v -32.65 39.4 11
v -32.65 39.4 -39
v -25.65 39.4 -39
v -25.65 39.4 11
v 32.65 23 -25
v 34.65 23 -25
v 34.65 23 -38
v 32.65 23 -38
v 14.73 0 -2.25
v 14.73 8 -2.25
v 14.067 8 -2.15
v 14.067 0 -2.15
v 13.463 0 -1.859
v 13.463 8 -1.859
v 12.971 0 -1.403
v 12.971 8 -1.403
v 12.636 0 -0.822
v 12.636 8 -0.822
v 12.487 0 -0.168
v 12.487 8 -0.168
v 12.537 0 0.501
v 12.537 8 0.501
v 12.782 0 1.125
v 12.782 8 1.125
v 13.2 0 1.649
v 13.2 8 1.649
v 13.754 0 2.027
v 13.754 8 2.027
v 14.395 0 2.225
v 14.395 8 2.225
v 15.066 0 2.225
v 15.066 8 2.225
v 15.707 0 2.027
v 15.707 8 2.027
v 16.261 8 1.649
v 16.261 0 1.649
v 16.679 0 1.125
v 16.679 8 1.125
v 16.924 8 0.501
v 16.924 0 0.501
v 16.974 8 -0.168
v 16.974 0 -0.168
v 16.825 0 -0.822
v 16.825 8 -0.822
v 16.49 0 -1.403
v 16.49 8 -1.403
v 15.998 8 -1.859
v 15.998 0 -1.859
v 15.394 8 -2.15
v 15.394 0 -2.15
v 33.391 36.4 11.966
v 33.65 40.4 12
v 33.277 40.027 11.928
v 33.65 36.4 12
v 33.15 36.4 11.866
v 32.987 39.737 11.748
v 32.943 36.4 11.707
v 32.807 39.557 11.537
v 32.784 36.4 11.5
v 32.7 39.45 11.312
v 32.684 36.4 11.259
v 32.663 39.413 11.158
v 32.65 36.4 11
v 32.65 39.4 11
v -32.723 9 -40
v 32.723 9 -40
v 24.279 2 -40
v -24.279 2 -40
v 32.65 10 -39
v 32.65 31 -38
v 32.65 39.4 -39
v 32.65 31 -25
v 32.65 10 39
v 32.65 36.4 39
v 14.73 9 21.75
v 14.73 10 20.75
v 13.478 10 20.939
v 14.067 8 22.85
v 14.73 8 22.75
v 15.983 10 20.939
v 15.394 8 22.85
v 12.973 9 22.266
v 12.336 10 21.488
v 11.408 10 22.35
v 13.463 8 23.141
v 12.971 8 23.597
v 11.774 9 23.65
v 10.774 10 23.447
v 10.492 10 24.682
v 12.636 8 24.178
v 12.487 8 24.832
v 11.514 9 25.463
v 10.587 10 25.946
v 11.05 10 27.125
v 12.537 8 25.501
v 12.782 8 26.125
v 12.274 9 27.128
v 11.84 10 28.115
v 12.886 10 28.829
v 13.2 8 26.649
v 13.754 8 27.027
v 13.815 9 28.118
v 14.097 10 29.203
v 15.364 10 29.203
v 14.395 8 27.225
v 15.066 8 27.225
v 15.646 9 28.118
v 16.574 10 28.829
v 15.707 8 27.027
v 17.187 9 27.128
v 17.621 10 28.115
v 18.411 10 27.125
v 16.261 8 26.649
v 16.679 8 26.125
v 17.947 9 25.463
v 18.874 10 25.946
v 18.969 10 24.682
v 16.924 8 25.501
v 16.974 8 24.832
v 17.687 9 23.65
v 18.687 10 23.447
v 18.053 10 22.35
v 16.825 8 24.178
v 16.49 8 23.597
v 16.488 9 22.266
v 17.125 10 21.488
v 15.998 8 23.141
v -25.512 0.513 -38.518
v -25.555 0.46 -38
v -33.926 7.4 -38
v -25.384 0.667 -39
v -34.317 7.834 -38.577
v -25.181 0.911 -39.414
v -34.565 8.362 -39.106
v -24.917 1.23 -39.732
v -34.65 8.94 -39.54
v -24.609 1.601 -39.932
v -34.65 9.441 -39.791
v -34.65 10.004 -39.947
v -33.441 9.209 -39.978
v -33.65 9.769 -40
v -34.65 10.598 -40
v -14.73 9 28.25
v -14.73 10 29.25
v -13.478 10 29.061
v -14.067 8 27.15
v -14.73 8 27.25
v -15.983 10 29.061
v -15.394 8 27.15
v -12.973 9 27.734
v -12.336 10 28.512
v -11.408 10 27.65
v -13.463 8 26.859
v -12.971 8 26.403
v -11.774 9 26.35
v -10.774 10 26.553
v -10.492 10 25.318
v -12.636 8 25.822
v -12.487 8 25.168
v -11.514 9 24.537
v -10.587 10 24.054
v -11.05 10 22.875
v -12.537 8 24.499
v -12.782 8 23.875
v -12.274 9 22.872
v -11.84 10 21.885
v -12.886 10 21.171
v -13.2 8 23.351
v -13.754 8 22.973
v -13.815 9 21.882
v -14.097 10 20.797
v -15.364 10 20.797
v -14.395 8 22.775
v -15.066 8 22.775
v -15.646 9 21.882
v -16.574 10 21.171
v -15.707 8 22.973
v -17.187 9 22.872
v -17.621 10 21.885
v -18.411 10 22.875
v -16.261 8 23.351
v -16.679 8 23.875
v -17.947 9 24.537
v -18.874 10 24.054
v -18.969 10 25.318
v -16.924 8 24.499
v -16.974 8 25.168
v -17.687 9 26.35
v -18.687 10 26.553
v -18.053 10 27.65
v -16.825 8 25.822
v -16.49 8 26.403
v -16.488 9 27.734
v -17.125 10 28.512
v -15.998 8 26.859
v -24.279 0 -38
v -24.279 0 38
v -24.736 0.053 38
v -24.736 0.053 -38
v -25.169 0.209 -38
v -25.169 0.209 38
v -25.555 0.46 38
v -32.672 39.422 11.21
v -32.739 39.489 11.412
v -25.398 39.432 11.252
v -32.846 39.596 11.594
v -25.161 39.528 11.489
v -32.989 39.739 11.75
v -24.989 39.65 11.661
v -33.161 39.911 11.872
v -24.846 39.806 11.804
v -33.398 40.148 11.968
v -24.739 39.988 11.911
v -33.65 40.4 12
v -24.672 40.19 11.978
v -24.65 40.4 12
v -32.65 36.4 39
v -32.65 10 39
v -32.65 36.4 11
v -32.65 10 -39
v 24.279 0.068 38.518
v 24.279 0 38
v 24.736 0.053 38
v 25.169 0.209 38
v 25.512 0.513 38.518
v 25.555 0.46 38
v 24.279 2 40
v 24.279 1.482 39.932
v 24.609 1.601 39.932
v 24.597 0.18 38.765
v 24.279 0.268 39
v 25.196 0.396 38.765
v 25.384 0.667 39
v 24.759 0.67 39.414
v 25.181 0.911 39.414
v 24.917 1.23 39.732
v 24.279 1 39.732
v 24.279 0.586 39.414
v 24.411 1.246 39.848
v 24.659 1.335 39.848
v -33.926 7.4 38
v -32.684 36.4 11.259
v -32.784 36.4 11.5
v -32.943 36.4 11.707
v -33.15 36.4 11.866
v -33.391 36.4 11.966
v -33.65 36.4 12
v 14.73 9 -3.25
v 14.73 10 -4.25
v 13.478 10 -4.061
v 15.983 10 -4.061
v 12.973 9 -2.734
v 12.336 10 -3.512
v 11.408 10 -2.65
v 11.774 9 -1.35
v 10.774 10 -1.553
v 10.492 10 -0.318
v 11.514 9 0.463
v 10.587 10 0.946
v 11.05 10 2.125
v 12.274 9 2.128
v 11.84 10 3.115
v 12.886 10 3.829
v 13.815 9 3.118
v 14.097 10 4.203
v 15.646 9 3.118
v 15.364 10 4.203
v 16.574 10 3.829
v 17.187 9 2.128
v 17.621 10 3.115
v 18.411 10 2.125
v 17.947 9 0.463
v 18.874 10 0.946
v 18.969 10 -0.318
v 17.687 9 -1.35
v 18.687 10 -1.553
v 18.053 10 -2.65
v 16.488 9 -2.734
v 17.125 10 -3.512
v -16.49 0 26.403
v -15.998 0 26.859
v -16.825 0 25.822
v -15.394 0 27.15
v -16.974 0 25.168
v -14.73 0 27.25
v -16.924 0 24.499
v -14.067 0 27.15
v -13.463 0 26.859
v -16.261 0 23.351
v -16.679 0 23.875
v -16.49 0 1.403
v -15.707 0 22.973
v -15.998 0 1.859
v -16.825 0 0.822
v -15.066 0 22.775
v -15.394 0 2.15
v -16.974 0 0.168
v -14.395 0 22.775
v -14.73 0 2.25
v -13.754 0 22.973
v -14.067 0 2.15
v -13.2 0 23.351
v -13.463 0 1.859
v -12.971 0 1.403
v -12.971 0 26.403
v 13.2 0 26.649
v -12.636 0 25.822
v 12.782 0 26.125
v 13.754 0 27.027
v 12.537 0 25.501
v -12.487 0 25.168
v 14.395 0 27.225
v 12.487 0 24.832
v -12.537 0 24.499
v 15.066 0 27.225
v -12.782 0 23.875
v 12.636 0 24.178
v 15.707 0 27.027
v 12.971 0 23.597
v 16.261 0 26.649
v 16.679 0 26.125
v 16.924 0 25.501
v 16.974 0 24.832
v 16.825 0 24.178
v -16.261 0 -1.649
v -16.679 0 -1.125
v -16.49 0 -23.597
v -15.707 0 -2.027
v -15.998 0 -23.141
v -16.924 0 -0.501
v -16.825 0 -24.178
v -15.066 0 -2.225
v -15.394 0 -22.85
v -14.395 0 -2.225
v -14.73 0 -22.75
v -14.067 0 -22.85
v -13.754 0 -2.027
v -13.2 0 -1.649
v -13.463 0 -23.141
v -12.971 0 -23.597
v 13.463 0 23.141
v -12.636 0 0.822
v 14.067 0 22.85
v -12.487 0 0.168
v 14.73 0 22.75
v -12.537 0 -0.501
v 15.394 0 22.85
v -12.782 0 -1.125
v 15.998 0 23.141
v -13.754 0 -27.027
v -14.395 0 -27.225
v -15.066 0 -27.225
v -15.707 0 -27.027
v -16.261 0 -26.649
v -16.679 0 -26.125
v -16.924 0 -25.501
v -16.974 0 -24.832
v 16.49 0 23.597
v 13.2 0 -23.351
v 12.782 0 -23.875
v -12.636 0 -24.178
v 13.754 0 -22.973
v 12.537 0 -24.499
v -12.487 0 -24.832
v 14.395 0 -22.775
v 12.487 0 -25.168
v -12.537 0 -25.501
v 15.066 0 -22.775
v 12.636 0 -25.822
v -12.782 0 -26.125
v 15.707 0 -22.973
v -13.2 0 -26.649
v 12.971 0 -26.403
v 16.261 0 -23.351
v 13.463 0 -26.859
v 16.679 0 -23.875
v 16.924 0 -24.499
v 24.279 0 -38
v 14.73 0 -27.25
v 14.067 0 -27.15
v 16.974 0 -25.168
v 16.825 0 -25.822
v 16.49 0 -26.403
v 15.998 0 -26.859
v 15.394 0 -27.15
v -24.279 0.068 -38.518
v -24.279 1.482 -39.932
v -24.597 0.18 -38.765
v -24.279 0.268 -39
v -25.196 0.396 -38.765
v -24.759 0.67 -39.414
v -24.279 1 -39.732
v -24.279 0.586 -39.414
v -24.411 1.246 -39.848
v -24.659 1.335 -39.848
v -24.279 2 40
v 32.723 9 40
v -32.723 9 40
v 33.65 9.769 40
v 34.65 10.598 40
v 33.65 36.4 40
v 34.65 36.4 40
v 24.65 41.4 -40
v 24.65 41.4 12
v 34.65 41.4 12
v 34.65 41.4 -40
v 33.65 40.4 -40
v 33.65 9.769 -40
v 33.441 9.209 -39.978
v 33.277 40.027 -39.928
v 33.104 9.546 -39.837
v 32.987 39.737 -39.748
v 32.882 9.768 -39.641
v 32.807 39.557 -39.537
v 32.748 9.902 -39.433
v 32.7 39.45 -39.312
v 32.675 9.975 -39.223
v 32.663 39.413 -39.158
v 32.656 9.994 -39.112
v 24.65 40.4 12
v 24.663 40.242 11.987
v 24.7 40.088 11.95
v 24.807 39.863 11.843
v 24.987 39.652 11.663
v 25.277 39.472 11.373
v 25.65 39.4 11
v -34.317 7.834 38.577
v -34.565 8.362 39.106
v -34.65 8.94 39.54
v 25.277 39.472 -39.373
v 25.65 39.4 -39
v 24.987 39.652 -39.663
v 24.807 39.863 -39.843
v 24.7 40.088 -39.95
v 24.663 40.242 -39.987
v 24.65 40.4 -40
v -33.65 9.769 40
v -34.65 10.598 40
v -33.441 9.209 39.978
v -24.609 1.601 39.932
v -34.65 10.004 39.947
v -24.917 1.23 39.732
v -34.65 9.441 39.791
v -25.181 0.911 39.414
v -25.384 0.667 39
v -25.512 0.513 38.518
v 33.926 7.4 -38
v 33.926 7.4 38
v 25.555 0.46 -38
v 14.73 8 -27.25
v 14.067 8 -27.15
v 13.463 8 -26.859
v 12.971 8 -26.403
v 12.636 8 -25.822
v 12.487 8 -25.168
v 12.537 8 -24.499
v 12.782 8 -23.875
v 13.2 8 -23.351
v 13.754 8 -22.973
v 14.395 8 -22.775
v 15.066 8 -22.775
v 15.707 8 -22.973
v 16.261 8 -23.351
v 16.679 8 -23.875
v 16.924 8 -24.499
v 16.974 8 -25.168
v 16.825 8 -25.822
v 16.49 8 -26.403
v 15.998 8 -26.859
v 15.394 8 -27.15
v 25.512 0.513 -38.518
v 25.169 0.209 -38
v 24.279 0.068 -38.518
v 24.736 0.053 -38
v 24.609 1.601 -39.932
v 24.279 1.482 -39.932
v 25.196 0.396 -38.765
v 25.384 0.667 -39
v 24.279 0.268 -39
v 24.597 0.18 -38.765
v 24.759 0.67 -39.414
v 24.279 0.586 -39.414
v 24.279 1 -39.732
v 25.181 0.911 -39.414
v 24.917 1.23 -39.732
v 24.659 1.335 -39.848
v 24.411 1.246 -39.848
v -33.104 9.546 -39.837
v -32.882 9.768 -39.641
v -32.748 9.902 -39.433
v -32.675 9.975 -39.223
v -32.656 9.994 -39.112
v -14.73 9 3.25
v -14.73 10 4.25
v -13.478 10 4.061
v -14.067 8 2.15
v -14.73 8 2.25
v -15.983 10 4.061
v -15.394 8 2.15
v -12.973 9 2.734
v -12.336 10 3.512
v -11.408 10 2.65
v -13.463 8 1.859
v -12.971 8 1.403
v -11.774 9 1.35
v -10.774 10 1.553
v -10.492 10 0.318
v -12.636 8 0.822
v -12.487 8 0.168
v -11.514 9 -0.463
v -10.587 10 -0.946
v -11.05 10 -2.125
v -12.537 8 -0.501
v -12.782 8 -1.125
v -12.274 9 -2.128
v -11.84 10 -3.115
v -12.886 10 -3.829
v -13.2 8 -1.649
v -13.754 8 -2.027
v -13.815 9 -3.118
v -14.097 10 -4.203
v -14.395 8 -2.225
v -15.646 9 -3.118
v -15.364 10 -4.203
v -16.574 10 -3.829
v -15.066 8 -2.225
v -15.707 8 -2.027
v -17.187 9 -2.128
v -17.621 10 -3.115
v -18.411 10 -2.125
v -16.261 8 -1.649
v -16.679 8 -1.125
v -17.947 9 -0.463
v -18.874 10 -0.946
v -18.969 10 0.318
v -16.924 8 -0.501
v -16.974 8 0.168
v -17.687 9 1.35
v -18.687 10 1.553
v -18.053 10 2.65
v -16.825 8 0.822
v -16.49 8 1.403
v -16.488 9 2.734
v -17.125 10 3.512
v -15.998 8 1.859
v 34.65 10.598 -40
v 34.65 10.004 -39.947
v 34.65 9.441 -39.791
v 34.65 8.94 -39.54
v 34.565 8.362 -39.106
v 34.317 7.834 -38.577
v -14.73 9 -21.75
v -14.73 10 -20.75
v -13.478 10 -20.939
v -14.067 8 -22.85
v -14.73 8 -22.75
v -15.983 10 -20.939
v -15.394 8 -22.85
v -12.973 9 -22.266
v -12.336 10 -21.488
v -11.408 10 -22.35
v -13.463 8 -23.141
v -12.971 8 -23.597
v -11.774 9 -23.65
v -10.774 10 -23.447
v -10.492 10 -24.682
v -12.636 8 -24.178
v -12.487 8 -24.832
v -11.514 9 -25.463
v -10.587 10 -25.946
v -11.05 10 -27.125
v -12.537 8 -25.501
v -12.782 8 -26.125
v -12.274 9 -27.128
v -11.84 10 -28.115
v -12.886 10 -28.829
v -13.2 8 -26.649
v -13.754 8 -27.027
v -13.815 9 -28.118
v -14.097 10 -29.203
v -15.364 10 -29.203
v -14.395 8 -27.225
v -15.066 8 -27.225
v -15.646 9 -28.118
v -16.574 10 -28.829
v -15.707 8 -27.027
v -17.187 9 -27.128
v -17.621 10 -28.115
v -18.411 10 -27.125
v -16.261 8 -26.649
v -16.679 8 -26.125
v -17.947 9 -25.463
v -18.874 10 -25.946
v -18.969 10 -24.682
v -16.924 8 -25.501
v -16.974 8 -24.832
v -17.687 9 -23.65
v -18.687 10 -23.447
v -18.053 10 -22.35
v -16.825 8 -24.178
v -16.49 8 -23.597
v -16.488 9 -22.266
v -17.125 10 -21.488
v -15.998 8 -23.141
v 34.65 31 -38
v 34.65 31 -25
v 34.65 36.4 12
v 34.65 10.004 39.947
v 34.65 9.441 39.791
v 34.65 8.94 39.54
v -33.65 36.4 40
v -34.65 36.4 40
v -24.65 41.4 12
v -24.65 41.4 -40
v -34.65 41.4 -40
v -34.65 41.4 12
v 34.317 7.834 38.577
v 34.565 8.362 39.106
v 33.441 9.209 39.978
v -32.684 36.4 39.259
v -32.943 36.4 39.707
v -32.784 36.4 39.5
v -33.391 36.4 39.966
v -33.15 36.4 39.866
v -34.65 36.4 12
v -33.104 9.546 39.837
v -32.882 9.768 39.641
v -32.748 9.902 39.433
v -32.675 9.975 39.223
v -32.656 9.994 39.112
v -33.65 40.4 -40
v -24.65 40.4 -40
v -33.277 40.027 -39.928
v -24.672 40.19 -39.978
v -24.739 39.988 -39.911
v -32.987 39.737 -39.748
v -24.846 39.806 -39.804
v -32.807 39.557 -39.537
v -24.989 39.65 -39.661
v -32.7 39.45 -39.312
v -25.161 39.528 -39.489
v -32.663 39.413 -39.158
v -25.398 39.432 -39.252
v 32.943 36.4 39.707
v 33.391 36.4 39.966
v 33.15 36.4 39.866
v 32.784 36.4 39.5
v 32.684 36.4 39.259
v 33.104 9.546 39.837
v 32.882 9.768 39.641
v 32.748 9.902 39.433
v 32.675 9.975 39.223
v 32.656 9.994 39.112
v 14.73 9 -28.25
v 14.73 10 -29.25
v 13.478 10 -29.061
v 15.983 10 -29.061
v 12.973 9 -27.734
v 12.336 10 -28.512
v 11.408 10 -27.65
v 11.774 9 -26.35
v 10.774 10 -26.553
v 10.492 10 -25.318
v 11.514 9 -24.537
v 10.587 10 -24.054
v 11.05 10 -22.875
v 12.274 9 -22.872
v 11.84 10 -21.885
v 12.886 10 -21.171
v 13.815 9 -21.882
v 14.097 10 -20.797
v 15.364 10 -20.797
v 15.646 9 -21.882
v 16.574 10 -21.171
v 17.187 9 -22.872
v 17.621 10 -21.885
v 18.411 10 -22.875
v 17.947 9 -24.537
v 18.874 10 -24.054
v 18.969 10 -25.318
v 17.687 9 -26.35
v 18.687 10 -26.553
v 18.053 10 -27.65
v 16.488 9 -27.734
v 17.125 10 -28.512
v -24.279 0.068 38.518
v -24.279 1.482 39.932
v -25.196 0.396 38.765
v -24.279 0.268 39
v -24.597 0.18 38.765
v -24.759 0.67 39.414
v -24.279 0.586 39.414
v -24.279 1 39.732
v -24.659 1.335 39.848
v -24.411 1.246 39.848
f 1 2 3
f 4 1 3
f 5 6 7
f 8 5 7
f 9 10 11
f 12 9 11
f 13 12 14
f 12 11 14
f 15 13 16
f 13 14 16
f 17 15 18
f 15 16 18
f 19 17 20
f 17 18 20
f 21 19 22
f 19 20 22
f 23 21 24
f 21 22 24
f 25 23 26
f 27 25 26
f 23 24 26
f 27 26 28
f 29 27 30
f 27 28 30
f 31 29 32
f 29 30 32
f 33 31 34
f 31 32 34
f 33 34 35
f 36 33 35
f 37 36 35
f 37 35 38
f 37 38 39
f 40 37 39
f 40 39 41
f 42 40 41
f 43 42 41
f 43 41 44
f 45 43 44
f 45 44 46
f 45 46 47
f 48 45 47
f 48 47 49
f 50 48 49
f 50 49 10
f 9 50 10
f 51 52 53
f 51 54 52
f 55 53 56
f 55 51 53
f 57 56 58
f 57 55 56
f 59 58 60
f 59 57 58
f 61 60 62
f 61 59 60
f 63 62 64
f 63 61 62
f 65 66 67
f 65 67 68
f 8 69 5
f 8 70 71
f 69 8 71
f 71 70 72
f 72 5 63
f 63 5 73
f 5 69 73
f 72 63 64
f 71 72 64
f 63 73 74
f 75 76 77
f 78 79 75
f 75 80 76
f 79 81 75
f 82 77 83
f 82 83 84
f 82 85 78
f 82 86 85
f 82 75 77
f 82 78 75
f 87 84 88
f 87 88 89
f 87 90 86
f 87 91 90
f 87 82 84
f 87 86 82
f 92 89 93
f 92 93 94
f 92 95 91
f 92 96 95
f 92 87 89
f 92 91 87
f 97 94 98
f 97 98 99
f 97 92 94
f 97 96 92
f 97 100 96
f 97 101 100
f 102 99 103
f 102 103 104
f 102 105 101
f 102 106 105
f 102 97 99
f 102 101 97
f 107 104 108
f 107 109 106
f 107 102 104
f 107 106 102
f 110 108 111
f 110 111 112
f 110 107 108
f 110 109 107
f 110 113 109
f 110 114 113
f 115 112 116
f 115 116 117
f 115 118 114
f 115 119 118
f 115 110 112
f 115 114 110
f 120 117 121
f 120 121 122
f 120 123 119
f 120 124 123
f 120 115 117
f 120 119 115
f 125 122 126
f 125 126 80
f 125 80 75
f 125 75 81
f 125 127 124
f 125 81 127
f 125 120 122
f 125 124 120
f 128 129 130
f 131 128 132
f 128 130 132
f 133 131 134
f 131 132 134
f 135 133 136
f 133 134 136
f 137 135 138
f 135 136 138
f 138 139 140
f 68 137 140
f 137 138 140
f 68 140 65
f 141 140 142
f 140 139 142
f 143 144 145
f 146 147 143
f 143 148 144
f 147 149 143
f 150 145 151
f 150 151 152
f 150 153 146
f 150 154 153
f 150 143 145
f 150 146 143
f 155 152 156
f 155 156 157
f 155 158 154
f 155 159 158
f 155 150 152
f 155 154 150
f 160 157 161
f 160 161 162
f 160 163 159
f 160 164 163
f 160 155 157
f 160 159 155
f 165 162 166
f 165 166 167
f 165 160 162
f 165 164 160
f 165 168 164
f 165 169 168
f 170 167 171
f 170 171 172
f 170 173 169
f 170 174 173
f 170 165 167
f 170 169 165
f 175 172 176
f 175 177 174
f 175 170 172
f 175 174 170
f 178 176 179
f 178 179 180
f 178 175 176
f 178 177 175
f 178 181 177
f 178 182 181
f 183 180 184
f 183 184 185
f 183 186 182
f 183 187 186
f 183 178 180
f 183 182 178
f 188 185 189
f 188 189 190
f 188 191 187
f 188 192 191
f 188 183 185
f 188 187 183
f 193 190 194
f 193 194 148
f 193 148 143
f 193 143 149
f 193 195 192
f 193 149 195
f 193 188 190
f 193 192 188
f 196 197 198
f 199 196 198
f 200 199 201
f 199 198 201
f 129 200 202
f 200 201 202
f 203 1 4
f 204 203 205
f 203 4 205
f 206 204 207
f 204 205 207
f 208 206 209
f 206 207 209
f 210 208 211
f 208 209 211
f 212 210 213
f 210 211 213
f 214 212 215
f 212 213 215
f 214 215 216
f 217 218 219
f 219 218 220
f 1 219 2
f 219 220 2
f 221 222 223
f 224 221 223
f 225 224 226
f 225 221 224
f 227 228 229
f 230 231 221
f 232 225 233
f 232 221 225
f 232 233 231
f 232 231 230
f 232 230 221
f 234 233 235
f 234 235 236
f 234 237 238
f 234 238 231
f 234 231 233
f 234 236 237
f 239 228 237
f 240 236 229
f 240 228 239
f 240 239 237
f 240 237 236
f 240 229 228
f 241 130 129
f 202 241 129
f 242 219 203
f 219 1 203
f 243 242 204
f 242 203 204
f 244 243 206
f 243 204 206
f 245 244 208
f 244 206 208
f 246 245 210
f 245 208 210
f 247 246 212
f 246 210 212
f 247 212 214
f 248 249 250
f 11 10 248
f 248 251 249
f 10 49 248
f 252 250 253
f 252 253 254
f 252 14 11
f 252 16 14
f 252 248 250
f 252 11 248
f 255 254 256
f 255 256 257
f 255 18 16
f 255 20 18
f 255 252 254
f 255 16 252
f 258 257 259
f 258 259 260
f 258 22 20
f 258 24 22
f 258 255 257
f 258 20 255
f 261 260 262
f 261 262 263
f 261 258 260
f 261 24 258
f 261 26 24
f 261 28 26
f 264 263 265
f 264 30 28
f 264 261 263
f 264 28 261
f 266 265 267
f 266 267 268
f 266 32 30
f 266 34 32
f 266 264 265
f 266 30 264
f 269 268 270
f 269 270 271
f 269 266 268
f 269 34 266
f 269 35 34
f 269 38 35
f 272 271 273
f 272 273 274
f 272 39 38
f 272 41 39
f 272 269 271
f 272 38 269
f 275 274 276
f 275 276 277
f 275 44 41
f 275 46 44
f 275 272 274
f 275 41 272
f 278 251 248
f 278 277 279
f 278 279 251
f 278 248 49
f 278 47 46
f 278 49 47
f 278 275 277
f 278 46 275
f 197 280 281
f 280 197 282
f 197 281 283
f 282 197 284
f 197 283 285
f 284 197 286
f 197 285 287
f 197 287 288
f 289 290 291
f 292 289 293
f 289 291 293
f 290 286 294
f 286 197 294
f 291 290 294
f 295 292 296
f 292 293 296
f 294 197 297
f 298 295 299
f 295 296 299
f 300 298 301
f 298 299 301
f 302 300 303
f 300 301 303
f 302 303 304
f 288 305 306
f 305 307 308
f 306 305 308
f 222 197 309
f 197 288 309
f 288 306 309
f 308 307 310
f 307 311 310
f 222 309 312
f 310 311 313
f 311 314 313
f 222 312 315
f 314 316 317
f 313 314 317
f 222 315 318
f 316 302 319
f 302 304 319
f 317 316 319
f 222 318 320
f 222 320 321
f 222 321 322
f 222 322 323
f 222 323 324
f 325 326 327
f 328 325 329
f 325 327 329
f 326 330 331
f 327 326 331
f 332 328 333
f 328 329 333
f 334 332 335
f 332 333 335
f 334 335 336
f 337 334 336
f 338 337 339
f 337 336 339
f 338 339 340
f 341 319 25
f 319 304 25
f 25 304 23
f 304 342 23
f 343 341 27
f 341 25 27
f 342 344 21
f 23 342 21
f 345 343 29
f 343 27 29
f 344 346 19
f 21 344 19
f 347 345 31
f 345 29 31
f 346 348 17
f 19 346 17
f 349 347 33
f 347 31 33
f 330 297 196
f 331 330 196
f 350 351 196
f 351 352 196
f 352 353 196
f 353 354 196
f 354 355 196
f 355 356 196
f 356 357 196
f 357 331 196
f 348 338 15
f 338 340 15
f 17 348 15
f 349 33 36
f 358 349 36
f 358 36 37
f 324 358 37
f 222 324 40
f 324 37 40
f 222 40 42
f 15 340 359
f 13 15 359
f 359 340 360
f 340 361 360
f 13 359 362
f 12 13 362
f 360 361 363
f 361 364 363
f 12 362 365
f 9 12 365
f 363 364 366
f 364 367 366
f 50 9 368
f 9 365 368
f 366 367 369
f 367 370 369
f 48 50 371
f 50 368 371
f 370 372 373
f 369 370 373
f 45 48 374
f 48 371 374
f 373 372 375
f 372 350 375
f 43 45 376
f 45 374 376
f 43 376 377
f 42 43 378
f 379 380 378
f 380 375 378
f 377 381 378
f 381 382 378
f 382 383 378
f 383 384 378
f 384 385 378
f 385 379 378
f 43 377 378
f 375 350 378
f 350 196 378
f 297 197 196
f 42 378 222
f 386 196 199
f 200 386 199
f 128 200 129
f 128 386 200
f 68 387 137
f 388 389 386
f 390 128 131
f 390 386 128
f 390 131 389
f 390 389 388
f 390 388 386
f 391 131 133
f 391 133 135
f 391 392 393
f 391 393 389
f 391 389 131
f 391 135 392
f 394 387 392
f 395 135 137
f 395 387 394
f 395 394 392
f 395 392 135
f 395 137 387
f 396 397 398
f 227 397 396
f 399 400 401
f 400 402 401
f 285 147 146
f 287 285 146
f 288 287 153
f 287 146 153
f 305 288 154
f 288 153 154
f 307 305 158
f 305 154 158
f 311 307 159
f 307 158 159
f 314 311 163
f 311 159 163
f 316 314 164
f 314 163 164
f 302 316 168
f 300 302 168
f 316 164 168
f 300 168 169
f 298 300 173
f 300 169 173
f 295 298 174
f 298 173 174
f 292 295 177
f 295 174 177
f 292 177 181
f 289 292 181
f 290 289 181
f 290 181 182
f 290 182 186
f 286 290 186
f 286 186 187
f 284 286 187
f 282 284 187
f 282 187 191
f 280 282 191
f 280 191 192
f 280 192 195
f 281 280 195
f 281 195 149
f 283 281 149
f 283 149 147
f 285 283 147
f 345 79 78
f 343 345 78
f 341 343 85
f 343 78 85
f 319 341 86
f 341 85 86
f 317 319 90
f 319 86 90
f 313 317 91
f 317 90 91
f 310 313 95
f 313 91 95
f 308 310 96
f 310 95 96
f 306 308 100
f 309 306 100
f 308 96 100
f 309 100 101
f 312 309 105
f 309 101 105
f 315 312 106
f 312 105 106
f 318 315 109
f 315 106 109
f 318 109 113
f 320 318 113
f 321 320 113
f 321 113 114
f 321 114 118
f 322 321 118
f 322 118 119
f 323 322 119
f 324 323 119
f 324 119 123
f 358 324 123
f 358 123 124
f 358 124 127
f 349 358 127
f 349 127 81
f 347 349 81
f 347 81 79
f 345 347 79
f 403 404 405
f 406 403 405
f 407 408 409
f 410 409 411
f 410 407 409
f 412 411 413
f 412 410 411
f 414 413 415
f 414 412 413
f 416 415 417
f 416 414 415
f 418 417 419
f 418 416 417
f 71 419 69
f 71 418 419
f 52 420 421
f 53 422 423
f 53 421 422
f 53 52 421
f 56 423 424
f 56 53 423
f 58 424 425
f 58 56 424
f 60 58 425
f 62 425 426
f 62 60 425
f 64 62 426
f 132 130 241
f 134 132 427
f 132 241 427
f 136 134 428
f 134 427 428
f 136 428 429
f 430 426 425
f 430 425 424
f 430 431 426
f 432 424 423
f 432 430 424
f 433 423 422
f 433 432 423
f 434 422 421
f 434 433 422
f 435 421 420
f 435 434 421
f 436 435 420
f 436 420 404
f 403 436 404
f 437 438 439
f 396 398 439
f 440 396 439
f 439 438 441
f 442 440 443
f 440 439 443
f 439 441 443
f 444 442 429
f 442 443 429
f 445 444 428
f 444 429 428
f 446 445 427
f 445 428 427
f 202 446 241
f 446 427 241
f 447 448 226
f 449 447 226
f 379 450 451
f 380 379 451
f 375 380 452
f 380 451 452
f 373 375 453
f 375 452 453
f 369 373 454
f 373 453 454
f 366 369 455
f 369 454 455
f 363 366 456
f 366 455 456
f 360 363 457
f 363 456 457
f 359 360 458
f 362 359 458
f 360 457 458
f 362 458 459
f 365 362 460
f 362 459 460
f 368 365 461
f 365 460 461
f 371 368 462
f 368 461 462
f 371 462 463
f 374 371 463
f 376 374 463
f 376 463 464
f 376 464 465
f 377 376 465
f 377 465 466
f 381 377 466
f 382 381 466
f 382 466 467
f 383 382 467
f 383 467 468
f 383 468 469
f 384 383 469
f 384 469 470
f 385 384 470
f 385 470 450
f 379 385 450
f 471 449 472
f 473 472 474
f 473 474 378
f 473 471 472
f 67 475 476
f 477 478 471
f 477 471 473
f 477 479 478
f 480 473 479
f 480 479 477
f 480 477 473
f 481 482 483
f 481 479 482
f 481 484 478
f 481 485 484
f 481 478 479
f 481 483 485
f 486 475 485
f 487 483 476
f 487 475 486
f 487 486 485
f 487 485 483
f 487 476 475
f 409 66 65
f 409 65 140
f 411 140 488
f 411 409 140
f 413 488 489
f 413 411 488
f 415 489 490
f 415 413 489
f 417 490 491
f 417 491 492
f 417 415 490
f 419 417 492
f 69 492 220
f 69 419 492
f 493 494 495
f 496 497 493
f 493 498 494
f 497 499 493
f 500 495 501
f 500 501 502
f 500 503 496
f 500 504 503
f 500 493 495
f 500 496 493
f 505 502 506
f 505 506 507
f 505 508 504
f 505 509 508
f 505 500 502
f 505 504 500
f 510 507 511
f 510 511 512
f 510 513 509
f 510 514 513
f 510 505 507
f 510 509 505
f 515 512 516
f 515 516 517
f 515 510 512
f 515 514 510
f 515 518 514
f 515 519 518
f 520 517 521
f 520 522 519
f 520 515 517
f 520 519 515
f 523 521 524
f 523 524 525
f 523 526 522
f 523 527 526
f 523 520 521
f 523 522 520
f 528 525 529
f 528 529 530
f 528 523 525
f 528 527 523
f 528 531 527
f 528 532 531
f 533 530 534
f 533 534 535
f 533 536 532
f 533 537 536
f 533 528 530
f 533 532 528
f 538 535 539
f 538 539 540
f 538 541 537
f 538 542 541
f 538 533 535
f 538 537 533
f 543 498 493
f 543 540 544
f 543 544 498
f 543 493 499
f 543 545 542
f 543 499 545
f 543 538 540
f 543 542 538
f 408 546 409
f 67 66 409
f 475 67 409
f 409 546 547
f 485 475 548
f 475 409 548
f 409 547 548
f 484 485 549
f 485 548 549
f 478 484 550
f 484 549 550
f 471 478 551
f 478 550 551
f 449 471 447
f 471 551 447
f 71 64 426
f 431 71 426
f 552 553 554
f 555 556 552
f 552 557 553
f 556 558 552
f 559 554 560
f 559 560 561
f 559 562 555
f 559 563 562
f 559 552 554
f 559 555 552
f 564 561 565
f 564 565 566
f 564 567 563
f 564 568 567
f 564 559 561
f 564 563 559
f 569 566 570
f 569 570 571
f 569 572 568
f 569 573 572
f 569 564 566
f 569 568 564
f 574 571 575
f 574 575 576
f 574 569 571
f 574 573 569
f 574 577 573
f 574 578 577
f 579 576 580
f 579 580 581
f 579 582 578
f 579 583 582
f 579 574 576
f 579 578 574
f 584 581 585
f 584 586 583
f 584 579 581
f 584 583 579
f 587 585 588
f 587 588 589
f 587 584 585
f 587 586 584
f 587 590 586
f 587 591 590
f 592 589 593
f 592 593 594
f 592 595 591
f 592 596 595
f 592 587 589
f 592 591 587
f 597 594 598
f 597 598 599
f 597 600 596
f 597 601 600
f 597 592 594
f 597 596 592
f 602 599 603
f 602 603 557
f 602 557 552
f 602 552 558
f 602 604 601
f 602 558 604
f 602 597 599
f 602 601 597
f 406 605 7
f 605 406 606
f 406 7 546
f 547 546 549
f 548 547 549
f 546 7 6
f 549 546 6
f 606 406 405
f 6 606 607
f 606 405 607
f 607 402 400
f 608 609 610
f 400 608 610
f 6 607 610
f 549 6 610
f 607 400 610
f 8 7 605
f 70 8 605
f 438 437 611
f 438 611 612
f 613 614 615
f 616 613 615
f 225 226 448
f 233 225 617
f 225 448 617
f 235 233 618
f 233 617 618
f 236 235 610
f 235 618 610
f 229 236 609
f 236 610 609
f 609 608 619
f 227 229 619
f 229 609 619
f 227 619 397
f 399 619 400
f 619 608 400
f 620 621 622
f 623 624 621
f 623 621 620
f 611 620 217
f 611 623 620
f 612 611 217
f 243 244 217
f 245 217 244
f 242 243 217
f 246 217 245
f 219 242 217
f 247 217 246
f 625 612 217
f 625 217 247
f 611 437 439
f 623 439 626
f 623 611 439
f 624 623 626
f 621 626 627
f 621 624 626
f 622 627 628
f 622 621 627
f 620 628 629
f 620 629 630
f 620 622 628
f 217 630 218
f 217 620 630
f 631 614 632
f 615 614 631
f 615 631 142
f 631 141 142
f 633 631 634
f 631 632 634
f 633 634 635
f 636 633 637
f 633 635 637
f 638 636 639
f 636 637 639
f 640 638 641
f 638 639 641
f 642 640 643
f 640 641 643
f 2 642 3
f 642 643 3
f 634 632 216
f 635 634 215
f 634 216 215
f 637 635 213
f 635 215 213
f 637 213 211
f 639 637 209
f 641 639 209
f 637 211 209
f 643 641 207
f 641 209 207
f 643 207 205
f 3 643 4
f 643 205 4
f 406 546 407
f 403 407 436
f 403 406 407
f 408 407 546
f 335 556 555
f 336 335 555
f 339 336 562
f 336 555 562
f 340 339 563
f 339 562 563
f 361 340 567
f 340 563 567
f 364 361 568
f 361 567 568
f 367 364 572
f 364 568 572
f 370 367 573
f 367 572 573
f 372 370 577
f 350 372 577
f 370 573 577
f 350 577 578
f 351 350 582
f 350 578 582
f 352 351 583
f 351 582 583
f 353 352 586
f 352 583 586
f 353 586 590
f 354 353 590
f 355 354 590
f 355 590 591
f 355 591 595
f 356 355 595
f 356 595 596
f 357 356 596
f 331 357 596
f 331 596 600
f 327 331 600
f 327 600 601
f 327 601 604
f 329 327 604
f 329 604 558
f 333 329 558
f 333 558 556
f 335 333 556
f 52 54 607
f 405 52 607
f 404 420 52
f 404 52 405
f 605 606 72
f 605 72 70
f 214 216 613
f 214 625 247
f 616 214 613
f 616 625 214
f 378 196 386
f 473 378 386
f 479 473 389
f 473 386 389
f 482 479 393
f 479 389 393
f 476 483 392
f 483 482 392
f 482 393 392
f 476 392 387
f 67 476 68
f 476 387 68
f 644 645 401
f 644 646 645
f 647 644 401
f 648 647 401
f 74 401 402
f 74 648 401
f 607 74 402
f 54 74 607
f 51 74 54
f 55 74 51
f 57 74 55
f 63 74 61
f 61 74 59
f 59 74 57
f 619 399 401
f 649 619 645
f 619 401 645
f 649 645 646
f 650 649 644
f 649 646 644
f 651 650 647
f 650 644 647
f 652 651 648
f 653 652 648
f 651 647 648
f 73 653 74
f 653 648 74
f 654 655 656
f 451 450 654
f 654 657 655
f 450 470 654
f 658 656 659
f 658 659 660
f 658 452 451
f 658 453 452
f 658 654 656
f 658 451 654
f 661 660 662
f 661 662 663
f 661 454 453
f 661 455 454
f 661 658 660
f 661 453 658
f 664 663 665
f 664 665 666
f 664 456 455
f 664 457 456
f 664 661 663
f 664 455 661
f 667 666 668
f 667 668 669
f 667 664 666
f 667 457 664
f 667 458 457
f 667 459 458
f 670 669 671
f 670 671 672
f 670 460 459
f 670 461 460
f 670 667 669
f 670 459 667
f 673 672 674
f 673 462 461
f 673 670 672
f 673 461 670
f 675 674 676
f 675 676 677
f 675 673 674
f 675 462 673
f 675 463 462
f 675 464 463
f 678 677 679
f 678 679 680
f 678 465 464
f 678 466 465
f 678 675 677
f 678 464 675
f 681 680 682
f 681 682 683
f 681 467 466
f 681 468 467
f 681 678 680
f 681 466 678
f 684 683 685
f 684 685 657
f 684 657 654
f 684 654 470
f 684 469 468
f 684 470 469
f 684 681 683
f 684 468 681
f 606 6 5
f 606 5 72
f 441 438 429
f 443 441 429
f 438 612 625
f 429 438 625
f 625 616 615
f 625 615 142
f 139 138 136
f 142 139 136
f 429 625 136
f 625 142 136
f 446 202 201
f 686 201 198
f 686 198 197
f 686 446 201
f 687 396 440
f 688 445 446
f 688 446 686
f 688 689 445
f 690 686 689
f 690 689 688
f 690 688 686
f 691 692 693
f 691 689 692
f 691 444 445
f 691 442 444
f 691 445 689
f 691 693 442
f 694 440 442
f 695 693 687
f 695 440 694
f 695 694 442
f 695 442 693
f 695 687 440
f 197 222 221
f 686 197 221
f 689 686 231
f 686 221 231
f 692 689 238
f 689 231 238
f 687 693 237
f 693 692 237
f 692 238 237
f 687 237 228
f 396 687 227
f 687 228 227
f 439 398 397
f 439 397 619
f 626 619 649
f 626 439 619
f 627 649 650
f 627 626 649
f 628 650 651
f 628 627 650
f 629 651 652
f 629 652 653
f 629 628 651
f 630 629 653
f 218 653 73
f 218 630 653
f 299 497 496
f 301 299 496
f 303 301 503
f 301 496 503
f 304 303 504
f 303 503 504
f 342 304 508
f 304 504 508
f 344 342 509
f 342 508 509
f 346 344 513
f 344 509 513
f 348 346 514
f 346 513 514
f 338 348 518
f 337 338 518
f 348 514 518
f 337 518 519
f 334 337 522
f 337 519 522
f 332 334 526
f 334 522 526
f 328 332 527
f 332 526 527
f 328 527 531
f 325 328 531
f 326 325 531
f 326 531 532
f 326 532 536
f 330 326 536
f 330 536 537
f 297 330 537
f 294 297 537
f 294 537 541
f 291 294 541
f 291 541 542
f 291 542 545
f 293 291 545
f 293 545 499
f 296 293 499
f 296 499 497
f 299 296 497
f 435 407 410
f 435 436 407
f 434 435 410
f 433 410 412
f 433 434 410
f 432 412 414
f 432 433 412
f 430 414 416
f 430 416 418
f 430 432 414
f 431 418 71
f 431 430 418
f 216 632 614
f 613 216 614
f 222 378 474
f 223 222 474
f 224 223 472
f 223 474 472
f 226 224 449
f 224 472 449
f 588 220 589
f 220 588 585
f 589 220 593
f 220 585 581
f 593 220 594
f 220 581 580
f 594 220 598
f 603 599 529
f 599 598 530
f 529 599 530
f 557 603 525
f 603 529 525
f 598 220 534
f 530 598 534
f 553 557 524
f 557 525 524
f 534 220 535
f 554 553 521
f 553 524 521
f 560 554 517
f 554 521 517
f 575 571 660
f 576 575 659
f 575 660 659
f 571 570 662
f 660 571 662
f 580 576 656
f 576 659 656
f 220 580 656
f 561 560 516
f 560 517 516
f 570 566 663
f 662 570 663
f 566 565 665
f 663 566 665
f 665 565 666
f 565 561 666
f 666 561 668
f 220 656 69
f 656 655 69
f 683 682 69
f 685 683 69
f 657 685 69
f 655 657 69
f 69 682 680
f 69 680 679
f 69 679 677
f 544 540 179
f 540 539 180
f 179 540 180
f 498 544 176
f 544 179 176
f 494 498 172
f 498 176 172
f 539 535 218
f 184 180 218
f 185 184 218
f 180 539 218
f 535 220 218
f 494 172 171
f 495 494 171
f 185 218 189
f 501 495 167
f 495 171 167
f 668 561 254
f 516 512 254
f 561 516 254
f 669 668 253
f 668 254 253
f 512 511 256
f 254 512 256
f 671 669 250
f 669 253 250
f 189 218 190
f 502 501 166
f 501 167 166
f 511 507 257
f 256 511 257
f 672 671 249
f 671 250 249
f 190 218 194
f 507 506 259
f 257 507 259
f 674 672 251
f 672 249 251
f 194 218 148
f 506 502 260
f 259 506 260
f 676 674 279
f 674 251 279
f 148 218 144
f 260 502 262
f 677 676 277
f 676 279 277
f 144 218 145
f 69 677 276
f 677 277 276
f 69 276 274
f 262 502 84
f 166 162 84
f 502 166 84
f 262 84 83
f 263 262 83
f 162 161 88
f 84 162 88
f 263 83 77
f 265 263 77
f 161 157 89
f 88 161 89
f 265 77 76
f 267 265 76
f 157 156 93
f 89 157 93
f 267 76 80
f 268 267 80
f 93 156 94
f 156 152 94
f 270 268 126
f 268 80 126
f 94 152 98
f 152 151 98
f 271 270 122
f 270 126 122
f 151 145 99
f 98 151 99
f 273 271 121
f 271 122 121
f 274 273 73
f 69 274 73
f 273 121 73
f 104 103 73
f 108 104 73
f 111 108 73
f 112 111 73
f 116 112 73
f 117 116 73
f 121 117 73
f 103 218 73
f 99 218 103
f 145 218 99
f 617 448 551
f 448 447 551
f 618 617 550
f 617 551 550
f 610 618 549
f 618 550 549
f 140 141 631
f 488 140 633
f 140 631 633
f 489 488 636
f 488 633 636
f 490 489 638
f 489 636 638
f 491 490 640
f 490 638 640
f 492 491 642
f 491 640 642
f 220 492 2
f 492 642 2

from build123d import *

# Parameters (mm, degrees)
SKETCH1_W               = 50
SKETCH1_H               = 80
BOSS_EXTRUDE1_DEPTH     = 10
SKETCH2_R               = 2.25
CUT_EXTRUDE1_DEPTH      = 49.218253805
CHAMFER1_SIZE           = 2
BOSS_EXTRUDE2_DEPTH     = 40
CUT_EXTRUDE2_DEPTH      = 68.19064295
CUT_EXTRUDE2_DEPTH_BACK = 68.19064295
SKETCH4_W               = 28
SKETCH4_H               = 5
CUT_EXTRUDE3_REACH      = 92.091
SKETCH5_W               = 13
SKETCH5_H               = 8
FILLET1_R               = 1
FILLET2_R               = 2


with BuildPart() as part:
    # Sketch1 → Boss-Extrude1 (new body)
    with BuildSketch(Plane(origin=(0, 0, 0), x_dir=(1, 0, 0), z_dir=(0, 1, 0))):
        Rectangle(SKETCH1_W, SKETCH1_H)
    extrude(amount=BOSS_EXTRUDE1_DEPTH)

    # Sketch2 → Cut-Extrude1 (cut, through all)
    with BuildSketch(Plane(origin=(0, 10, 0), x_dir=(1, 0, 0), z_dir=(0, 1, 0))):
        with Locations(Location((-14.730430452, 0, 0), (0, 0, 270))):
            Circle(SKETCH2_R)
        with Locations(Location((-14.730430452, 25, 0), (0, 0, 270))):
            Circle(SKETCH2_R)
        with Locations(Location((-14.730430452, -25, 0), (0, 0, 270))):
            Circle(SKETCH2_R)
        with Locations(Location((14.730430452, -25, 0), (0, 0, 90))):
            Circle(SKETCH2_R)
        with Locations(Location((14.730430452, 0, 0), (0, 0, 90))):
            Circle(SKETCH2_R)
        with Locations(Location((14.730430452, 25, 0), (0, 0, 90))):
            Circle(SKETCH2_R)
    extrude(amount=-CUT_EXTRUDE1_DEPTH, mode=Mode.SUBTRACT)

    # Chamfer1
    chamfer1_edges = [part.edges().sort_by_distance(p)[0] for p in [
        (-14.730430452, 10, -27.25),
        (-14.730430452, 10, 22.75),
        (14.730430452, 10, 27.25),
        (14.730430452, 10, 2.25),
        (14.730430452, 10, -22.75),
        (-14.730430452, 10, -2.25),
    ]]
    chamfer(chamfer1_edges, length=CHAMFER1_SIZE)

    # Sketch3 → Boss-Extrude2 (add, symmetric)
    with BuildSketch(Plane.XY):
        Polygon((-25, 10), (-32.65, 10), (-32.65, 39.4), (-24.65, 39.4), (-24.65, 41.4), (-34.65, 41.4), (-34.65, 8), (-25, 0), align=None)
        Polygon((34.65, 8), (25, 0), (25, 10), (32.65, 10), (32.65, 39.4), (24.65, 39.4), (24.65, 41.4), (34.65, 41.4), align=None)
    extrude(amount=BOSS_EXTRUDE2_DEPTH, both=True)

    # Sketch4 → Cut-Extrude2 (cut, two sides: drawn at the far end of the back side and taken through both)
    with BuildSketch(Plane(origin=(0, 0, 0), x_dir=(0, 0, -1), z_dir=(1, 0, 0)).offset(-CUT_EXTRUDE2_DEPTH_BACK)):
        with Locations((-26, 38.9)):
            Rectangle(SKETCH4_W, SKETCH4_H)
    extrude(amount=CUT_EXTRUDE2_DEPTH + CUT_EXTRUDE2_DEPTH_BACK, mode=Mode.SUBTRACT)

    # Sketch5 → Cut-Extrude3 (cut, up to next)
    with BuildSketch(Plane(origin=(34.65, 0, 0), x_dir=(0, 0, -1), z_dir=(1, 0, 0)), mode=Mode.PRIVATE) as cut_extrude3_sk1:
        with Locations((31.5, 27)):
            Rectangle(SKETCH5_W, SKETCH5_H)
    cut_extrude3_tool1 = extrude(cut_extrude3_sk1.sketch, amount=-CUT_EXTRUDE3_REACH, mode=Mode.PRIVATE) & part.part
    add(cut_extrude3_tool1.solids().sort_by_distance((34.65, 27, -31.5))[0], mode=Mode.SUBTRACT)

    # Fillet1
    fillet1_edges = [part.edges().sort_by_distance(p)[0] for p in [
        (32.65, 23.2, 40),
        (32.65, 37.9, 12),
        (24.65, 39.4, -14),
        (-24.65, 39.4, -14),
        (-28.65, 39.4, 12),
        (-32.65, 37.9, 12),
        (28.65, 39.4, 12),
        (0, 10, 40),
        (-32.65, 24.7, -40),
        (-28.65, 39.4, -40),
        (-32.65, 23.2, 40),
        (0, 10, -40),
        (28.65, 39.4, -40),
        (32.65, 24.7, -40),
    ]]
    fillet(fillet1_edges, radius=FILLET1_R)

    # Fillet2
    # the kernel refuses this fillet: 2 mm, written as the material it takes off along each edge
    with BuildSketch(Plane(origin=(-24.278787146, 2, 38), x_dir=(0, -1, 0), z_dir=(0, 0, 1))) as fillet2_piece_1_section:
        Polygon((0, 0), (FILLET2_R * 1.02, 0), (FILLET2_R * 1.02, -FILLET2_R * 0.367818555432), (FILLET2_R * 0.785250632337, -FILLET2_R * 0.650984980176), align=None)
    fillet2_piece_1 = extrude(amount=FILLET2_R * 1.02, mode=Mode.PRIVATE)
    fillet2_piece_1 = fillet2_piece_1 - Plane(origin=(-24.278787146, 2, 38), x_dir=(0.3392244381566016, 0.9407054696116836, 0), z_dir=(0, 0, 1)) * Sphere(FILLET2_R, mode=Mode.PRIVATE)
    add(fillet2_piece_1, mode=Mode.SUBTRACT)
    with BuildSketch(Plane(origin=(24.278787146, 2, -38), x_dir=(0, -1, 0), z_dir=(0, 0, -1))) as fillet2_piece_2_section:
        Polygon((0, 0), (FILLET2_R * 1.02, 0), (FILLET2_R * 1.02, -FILLET2_R * 0.367818555432), (FILLET2_R * 0.785250632337, -FILLET2_R * 0.650984980176), align=None)
    fillet2_piece_2 = extrude(amount=FILLET2_R * 1.02, mode=Mode.PRIVATE)
    fillet2_piece_2 = fillet2_piece_2 - Plane(origin=(24.278787146, 2, -38), x_dir=(-0.3392244381566016, 0.9407054696116836, 0), z_dir=(0, 0, -1)) * Sphere(FILLET2_R, mode=Mode.PRIVATE)
    add(fillet2_piece_2, mode=Mode.SUBTRACT)
    with BuildSketch(Plane(origin=(24.278787146, 2, 38), x_dir=(0, -1, 0), z_dir=(0, 0, 1))) as fillet2_piece_3_section:
        Polygon((0, 0), (FILLET2_R * 1.02, 0), (FILLET2_R * 1.02, FILLET2_R * 0.367818555432), (FILLET2_R * 0.785250632337, FILLET2_R * 0.650984980176), align=None)
    fillet2_piece_3 = extrude(amount=FILLET2_R * 1.02, mode=Mode.PRIVATE)
    fillet2_piece_3 = fillet2_piece_3 - Plane(origin=(24.278787146, 2, 38), x_dir=(-0.3392244381566016, 0.9407054696116836, 0), z_dir=(0, 0, 1)) * Sphere(FILLET2_R, mode=Mode.PRIVATE)
    add(fillet2_piece_3, mode=Mode.SUBTRACT)
    with BuildSketch(Plane(origin=(-24.278787146, 2, -38), x_dir=(0, -1, 0), z_dir=(0, 0, -1))) as fillet2_piece_4_section:
        Polygon((0, 0), (FILLET2_R * 1.02, 0), (FILLET2_R * 1.02, FILLET2_R * 0.367818555432), (FILLET2_R * 0.785250632337, FILLET2_R * 0.650984980176), align=None)
    fillet2_piece_4 = extrude(amount=FILLET2_R * 1.02, mode=Mode.PRIVATE)
    fillet2_piece_4 = fillet2_piece_4 - Plane(origin=(-24.278787146, 2, -38), x_dir=(0.3392244381566016, 0.9407054696116836, 0), z_dir=(0, 0, -1)) * Sphere(FILLET2_R, mode=Mode.PRIVATE)
    add(fillet2_piece_4, mode=Mode.SUBTRACT)
    with BuildSketch(Plane(origin=(-38.499267806, 11.191102844, 40), x_dir=(0.6382205687997308, 0.7698535611146761, -3.5527136788005e-15), z_dir=(0.7698535611146761, -0.6382205687997308, 0)), Plane(origin=(-38.499267806, 11.191102844, -40), x_dir=(0, 0, 1), z_dir=(0.7698535611146761, -0.6382205687997308, 0))) as fillet2_piece_5:
        with BuildLine():
            CenterArc((FILLET2_R, -FILLET2_R), FILLET2_R, 90, 90)
            Line((0, -FILLET2_R), (-FILLET2_R * 0.02, -FILLET2_R))
            Line((-FILLET2_R * 0.02, -FILLET2_R), (-FILLET2_R * 0.02, FILLET2_R * 0.02))
            Line((-FILLET2_R * 0.02, FILLET2_R * 0.02), (FILLET2_R, FILLET2_R * 0.02))
            Line((FILLET2_R, FILLET2_R * 0.02), (FILLET2_R, 0))
        make_face()
    extrude(amount=16.813638561, mode=Mode.SUBTRACT)
    with BuildSketch(Plane(origin=(38.499267806, 11.191102844, -40), x_dir=(0, 0, 1), z_dir=(-0.7698535611146761, -0.6382205687997308, 0)), Plane(origin=(38.499267806, 11.191102844, 40), x_dir=(-0.6382205687997308, 0.7698535611146761, -3.5527136788005e-15), z_dir=(-0.7698535611146761, -0.6382205687997308, 0))) as fillet2_piece_6:
        with BuildLine():
            CenterArc((FILLET2_R, FILLET2_R), FILLET2_R, 180, 90)
            Line((0, FILLET2_R), (-FILLET2_R * 0.02, FILLET2_R))
            Line((-FILLET2_R * 0.02, FILLET2_R), (-FILLET2_R * 0.02, -FILLET2_R * 0.02))
            Line((-FILLET2_R * 0.02, -FILLET2_R * 0.02), (FILLET2_R, -FILLET2_R * 0.02))
            Line((FILLET2_R, -FILLET2_R * 0.02), (FILLET2_R, 0))
        make_face()
    extrude(amount=16.813638561, mode=Mode.SUBTRACT)
    with BuildSketch(Plane(origin=(-24.278787146, 0, -40), x_dir=(0, 0, 1), z_dir=(1, 0, 0)), Plane(origin=(24.278787146, 0, 40), x_dir=(0, 0, -1), z_dir=(-1, 0, 0))) as fillet2_piece_7:
        with BuildLine():
            CenterArc((FILLET2_R, -FILLET2_R), FILLET2_R, 90, 90)
            Line((0, -FILLET2_R), (-FILLET2_R * 0.02, -FILLET2_R))
            Line((-FILLET2_R * 0.02, -FILLET2_R), (-FILLET2_R * 0.02, FILLET2_R * 0.02))
            Line((-FILLET2_R * 0.02, FILLET2_R * 0.02), (FILLET2_R, FILLET2_R * 0.02))
            Line((FILLET2_R, FILLET2_R * 0.02), (FILLET2_R, 0))
        make_face()
    extrude(amount=48.557574292, mode=Mode.SUBTRACT)
    with BuildSketch(Plane(origin=(-34.65, 8, 42.349663946), x_dir=(0, 1, 0), z_dir=(0, 0, -1)), Plane(origin=(34.65, 8, -42.349663946), x_dir=(0, 1, 0), z_dir=(0, 0, 1))) as fillet2_piece_8:
        with BuildLine():
            CenterArc((FILLET2_R * 0.469932789135, FILLET2_R), FILLET2_R, 219.659259409, 50.340740591)
            Line((-FILLET2_R * 0.299920771979, FILLET2_R * 0.3617794312), (-FILLET2_R * 0.315317843202, FILLET2_R * 0.349015019824))
            Line((-FILLET2_R * 0.315317843202, FILLET2_R * 0.349015019824), (-FILLET2_R * 0.0093986557827, -FILLET2_R * 0.02))
            Line((-FILLET2_R * 0.0093986557827, -FILLET2_R * 0.02), (FILLET2_R * 0.469932789135, -FILLET2_R * 0.02))
            Line((FILLET2_R * 0.469932789135, -FILLET2_R * 0.02), (FILLET2_R * 0.469932789135, 0))
        make_face()
    extrude(amount=84.699327891, mode=Mode.SUBTRACT)
    with BuildSketch(Plane(origin=(25, 0, -38), x_dir=(-1, 0, 0), z_dir=(0, 0, 1)), Plane(origin=(-25, 0, 38), x_dir=(1, 0, 0), z_dir=(0, 0, -1))) as fillet2_piece_9:
        with BuildLine():
            CenterArc((FILLET2_R * 0.360606426894, -FILLET2_R), FILLET2_R, 90, 39.659259409)
            Line((-FILLET2_R * 0.277614141905, -FILLET2_R * 0.230146438885), (-FILLET2_R * 0.290378553281, -FILLET2_R * 0.214749367663))
            Line((-FILLET2_R * 0.290378553281, -FILLET2_R * 0.214749367663), (-FILLET2_R * 0.00721212853789, FILLET2_R * 0.02))
            Line((-FILLET2_R * 0.00721212853789, FILLET2_R * 0.02), (FILLET2_R * 0.360606426894, FILLET2_R * 0.02))
            Line((FILLET2_R * 0.360606426894, FILLET2_R * 0.02), (FILLET2_R * 0.360606426894, 0))
        make_face()
    extrude(amount=76, mode=Mode.SUBTRACT)


solid = part.part
